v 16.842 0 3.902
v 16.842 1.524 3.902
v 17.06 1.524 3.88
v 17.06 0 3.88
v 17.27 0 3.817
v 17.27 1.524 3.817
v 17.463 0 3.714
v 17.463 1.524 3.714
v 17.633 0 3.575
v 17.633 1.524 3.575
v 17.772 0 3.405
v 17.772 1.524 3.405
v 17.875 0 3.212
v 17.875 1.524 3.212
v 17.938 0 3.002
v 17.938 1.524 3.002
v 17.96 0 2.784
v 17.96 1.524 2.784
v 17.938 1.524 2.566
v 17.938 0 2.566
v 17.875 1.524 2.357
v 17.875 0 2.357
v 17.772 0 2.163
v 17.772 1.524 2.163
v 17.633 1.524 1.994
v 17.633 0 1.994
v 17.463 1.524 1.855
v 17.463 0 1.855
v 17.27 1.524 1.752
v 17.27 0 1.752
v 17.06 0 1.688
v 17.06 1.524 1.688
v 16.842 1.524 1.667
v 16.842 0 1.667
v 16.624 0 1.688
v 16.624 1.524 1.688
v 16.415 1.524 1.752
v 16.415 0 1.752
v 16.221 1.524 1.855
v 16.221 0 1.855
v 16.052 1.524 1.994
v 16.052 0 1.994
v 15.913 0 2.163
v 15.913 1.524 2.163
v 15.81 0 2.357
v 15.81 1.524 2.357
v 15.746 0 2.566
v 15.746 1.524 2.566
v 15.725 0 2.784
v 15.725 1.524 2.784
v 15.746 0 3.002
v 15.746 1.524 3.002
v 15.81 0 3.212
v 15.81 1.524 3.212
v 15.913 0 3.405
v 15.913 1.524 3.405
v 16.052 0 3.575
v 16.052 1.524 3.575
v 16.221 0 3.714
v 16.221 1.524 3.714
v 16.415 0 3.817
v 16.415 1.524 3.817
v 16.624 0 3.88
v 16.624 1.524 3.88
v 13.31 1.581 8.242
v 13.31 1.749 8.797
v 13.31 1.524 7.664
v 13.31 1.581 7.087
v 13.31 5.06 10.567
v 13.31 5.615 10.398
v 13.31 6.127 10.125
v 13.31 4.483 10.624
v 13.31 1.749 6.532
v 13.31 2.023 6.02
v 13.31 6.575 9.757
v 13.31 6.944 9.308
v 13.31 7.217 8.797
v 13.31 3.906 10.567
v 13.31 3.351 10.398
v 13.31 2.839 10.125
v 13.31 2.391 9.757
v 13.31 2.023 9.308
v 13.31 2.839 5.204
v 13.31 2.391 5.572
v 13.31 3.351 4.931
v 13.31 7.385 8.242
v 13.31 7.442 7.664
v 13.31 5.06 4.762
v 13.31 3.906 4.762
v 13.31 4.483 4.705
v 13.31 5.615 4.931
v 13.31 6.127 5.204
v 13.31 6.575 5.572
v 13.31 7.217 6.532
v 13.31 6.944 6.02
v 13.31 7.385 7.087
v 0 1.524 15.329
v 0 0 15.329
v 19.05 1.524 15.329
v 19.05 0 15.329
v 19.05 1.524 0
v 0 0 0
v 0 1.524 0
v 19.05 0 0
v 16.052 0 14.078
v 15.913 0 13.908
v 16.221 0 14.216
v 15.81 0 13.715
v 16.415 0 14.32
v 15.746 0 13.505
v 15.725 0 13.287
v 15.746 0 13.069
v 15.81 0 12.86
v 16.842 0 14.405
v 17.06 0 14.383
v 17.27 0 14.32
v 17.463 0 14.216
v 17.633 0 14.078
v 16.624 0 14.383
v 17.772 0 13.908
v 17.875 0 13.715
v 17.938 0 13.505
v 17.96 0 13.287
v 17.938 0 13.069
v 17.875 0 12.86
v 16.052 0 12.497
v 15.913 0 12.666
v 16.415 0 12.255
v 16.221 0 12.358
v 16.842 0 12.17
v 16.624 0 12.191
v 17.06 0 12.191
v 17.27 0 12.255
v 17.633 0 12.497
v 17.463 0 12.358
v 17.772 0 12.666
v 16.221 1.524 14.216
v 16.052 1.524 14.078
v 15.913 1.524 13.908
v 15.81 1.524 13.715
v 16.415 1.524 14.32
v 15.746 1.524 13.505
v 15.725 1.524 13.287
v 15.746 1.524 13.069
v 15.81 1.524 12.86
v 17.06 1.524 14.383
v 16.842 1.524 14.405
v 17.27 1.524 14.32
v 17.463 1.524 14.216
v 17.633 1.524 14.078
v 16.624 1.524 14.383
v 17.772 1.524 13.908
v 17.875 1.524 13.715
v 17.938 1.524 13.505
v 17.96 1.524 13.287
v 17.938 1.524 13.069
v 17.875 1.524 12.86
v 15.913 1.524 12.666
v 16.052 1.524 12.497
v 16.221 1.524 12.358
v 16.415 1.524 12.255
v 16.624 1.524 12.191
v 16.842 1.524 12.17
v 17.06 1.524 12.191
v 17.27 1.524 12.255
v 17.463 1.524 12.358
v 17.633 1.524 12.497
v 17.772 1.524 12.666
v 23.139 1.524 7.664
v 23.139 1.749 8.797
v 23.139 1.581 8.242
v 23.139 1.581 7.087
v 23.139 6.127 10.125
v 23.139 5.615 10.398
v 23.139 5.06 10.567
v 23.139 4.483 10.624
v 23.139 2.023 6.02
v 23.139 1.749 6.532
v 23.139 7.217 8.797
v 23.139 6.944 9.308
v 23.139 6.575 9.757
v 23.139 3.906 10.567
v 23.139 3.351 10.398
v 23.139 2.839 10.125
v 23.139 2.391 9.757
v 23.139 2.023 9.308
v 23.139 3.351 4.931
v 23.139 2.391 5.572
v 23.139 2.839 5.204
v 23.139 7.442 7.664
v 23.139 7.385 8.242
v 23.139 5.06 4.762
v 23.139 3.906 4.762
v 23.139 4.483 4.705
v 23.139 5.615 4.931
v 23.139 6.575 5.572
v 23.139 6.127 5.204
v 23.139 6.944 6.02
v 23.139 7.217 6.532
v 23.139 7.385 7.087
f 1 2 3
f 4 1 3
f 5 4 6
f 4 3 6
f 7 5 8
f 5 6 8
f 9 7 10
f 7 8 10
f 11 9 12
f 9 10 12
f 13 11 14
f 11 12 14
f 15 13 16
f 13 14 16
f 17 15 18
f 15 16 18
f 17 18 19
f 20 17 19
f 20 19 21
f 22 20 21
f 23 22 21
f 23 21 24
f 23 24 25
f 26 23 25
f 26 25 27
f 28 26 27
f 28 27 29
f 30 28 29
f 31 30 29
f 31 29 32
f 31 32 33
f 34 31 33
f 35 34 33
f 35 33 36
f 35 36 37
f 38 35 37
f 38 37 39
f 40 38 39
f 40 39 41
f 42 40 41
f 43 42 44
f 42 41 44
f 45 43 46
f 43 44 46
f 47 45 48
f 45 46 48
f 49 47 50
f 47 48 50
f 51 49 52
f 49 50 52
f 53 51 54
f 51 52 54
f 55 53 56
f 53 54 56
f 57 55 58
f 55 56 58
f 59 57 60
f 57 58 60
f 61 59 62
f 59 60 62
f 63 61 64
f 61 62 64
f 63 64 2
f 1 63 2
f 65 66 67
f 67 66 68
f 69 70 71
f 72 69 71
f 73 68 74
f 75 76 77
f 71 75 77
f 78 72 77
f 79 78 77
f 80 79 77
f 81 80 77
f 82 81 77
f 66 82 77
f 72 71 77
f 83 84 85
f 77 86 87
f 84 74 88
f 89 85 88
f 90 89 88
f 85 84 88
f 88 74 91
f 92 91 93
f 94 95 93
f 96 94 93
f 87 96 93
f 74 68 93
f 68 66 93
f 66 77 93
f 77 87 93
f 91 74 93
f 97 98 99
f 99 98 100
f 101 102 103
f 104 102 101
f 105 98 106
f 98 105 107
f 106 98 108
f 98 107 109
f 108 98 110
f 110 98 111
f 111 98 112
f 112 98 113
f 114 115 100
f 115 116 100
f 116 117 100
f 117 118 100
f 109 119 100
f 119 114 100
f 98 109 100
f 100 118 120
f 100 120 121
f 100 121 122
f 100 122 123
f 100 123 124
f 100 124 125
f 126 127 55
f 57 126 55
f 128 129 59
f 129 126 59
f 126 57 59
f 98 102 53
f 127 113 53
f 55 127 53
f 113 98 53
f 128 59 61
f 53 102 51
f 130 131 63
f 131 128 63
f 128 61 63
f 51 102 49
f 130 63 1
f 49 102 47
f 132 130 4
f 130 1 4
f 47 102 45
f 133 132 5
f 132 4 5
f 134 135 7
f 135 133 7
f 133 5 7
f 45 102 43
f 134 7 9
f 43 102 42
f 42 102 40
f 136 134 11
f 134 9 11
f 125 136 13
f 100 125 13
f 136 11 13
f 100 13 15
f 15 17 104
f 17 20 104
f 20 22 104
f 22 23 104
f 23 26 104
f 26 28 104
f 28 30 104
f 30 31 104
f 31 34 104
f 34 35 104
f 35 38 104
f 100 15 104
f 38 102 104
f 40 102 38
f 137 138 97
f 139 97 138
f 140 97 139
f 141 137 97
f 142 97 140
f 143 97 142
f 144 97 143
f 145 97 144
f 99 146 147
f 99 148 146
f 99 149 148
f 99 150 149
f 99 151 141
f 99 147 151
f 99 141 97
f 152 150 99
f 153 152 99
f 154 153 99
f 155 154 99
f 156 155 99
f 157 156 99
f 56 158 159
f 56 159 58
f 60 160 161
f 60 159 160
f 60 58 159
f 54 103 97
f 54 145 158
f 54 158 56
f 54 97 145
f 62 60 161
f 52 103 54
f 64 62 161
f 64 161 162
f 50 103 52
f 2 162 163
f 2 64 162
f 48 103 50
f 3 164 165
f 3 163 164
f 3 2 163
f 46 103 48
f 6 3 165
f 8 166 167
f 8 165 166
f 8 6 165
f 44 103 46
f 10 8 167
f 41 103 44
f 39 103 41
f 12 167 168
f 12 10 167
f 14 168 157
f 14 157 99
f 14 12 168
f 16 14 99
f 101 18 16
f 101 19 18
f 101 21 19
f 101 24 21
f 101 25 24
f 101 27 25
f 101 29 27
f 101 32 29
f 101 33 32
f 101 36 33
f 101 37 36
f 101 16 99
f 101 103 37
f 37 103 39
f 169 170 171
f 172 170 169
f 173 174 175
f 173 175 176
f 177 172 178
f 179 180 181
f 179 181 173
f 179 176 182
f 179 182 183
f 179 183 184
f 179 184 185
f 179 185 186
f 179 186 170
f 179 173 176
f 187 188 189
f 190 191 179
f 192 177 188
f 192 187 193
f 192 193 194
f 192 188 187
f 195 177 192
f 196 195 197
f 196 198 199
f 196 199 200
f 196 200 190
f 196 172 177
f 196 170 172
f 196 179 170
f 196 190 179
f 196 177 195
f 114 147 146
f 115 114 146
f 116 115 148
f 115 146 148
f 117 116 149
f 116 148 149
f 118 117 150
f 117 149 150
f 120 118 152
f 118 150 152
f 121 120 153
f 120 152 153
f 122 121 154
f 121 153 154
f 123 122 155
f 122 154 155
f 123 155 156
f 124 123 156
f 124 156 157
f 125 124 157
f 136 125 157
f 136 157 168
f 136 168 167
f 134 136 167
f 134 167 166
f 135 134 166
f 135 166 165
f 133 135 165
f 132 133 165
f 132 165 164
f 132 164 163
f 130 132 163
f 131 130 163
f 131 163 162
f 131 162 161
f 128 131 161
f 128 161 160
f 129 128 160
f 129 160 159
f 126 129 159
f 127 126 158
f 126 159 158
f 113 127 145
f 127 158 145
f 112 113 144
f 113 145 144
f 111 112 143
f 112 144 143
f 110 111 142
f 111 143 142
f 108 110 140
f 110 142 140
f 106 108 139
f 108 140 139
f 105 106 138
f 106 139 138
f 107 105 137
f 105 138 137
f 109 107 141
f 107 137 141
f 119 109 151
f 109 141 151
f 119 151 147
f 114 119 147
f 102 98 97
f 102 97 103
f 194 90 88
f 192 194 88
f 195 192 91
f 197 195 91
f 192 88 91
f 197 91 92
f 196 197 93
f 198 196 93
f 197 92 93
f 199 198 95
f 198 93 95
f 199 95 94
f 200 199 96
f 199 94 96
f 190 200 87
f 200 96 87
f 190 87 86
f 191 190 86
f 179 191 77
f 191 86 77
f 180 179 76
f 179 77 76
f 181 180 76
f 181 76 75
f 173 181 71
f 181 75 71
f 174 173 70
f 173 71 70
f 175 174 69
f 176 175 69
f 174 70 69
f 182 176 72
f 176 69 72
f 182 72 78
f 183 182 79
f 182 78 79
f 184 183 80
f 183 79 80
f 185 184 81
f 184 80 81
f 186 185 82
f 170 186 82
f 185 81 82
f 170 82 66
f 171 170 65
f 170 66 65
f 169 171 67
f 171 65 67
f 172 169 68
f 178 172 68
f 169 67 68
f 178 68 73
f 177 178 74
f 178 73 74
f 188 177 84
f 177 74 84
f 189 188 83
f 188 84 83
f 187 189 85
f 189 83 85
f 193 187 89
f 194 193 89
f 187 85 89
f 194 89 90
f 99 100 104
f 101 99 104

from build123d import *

# Parameters (mm, degrees)
SKETCH1_W                = 19.05
SKETCH1_H                = 15.3289
BOSS_EXTRUDE1_DEPTH      = 1.524
BOSS_EXTRUDE2_DEPTH      = 4.0894
BOSS_EXTRUDE2_DEPTH_BACK = 5.7404
SKETCH3_R                = 2.9591
SKETCH6_R                = 1.1176
CUT_EXTRUDE1_DEPTH       = 4.0894


with BuildPart() as part:
    # Sketch1 → Boss-Extrude1 (new body)
    with BuildSketch(Plane(origin=(0, 0, 0), x_dir=(1, 0, 0), z_dir=(0, 1, 0))):
        with Locations((9.525, -7.66445)):
            Rectangle(SKETCH1_W, SKETCH1_H)
    extrude(amount=BOSS_EXTRUDE1_DEPTH)

    # Sketch6 → Cut-Extrude1 (cut)
    with BuildSketch(Plane(origin=(0, 1.524, 0), x_dir=(1, 0, 0), z_dir=(0, 1, 0))):
        with Locations(Location((16.842353548, -13.287240698, 0), (0, 0, 270))):
            Circle(SKETCH6_R)
        with Locations(Location((16.842353548, -2.784340698, 0), (0, 0, 270))):
            Circle(SKETCH6_R)
    extrude(amount=-CUT_EXTRUDE1_DEPTH, mode=Mode.SUBTRACT)


with BuildPart() as body_2:
    # Sketch3 → Boss-Extrude2 (new, two sides: drawn at the far end of the back side and taken through both)
    with BuildSketch(Plane(origin=(19.05, 0, 0), x_dir=(0, 0, -1), z_dir=(1, 0, 0)).offset(-BOSS_EXTRUDE2_DEPTH_BACK)):
        with Locations((-7.66445, 4.4831)):
            Circle(SKETCH3_R)
    extrude(amount=BOSS_EXTRUDE2_DEPTH + BOSS_EXTRUDE2_DEPTH_BACK)


solid = Compound([part.part, body_2.part])
